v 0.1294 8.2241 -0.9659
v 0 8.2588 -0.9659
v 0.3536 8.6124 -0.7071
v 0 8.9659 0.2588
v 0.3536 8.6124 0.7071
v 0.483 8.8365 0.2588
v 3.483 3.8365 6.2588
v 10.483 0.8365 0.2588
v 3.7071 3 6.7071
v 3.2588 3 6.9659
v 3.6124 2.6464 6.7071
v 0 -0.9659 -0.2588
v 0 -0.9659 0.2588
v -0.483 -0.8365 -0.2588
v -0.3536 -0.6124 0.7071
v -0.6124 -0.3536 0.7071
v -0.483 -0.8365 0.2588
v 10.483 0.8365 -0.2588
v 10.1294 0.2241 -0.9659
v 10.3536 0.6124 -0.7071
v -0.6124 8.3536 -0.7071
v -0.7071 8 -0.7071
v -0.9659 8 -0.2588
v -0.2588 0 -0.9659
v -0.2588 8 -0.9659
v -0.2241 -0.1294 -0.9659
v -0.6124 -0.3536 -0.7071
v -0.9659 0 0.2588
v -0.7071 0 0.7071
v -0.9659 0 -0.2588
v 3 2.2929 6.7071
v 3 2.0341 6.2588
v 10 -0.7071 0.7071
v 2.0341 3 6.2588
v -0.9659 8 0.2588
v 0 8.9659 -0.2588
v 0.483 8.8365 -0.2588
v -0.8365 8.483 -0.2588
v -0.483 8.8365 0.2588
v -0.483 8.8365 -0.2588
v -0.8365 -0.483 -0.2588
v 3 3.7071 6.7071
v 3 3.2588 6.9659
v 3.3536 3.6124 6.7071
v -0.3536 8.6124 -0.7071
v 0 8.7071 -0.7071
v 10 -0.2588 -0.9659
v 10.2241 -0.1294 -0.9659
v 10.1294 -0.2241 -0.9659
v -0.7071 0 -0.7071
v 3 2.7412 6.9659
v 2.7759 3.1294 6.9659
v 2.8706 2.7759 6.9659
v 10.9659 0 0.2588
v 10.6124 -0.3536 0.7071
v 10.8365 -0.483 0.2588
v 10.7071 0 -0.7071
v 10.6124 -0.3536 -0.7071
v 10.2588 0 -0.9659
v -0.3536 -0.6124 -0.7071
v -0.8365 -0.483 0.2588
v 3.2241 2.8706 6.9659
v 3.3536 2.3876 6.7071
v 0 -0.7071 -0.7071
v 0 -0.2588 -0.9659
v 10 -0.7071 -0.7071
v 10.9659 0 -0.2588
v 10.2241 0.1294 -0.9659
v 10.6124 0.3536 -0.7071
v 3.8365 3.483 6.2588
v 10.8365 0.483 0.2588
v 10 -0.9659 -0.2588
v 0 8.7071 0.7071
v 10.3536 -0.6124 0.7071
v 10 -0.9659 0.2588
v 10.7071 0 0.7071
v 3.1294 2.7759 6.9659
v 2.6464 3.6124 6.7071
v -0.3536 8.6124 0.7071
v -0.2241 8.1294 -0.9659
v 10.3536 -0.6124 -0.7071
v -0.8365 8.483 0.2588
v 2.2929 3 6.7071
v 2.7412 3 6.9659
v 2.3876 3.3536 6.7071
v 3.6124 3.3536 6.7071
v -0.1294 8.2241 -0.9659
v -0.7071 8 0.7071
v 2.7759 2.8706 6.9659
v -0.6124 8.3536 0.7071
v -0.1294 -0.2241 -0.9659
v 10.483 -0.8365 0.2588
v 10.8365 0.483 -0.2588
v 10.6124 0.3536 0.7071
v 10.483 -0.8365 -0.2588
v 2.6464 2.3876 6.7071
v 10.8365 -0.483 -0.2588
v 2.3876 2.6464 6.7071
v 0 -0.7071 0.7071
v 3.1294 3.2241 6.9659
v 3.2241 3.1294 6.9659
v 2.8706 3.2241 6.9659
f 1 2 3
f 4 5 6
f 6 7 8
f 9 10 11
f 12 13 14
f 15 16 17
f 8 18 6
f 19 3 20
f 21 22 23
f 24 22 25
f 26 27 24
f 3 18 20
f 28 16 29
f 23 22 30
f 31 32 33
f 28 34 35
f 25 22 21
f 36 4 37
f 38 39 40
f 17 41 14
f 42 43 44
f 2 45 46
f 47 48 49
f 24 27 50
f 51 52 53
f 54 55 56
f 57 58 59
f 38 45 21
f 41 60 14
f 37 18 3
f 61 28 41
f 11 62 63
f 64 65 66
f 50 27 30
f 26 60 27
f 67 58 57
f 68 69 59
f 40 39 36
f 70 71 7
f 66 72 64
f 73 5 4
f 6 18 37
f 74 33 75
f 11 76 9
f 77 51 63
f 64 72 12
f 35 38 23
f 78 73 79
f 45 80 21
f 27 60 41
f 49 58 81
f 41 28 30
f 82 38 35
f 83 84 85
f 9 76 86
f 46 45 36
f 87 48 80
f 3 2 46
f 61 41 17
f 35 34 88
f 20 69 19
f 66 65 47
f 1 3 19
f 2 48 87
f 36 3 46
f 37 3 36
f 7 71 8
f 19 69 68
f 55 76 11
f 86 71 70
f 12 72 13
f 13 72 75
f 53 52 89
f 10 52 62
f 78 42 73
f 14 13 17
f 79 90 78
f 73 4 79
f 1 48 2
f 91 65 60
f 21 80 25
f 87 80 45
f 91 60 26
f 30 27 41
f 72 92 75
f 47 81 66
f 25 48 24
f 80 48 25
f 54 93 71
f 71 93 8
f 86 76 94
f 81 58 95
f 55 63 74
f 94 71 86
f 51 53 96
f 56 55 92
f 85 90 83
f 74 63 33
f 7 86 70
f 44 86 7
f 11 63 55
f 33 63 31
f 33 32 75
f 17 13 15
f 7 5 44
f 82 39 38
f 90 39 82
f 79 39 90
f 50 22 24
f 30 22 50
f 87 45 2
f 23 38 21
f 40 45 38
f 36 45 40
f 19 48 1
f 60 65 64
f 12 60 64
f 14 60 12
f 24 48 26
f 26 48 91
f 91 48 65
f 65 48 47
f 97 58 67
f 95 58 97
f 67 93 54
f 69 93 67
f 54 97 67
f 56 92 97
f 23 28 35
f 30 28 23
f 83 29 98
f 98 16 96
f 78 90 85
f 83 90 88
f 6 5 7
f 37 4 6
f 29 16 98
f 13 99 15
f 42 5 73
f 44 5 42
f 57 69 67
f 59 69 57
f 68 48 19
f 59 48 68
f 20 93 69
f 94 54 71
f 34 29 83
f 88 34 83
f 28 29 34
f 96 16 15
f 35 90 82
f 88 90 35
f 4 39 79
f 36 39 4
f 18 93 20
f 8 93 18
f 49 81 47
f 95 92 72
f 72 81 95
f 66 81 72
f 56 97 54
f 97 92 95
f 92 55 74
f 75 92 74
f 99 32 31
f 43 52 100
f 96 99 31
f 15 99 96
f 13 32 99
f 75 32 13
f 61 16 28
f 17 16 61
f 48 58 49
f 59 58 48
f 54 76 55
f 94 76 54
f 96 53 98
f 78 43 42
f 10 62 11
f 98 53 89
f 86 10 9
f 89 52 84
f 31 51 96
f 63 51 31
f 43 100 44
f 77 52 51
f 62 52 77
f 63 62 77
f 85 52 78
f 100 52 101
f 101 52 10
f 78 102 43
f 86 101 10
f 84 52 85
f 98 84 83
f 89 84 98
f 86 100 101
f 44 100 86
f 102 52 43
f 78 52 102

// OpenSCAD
// hull of four spheres
hull() {
  for (p = [[0, 0, 0], [10, 0, 0], [0, 8, 0], [3, 3, 6]]) translate(p) sphere(1, $fn = 12);
}
